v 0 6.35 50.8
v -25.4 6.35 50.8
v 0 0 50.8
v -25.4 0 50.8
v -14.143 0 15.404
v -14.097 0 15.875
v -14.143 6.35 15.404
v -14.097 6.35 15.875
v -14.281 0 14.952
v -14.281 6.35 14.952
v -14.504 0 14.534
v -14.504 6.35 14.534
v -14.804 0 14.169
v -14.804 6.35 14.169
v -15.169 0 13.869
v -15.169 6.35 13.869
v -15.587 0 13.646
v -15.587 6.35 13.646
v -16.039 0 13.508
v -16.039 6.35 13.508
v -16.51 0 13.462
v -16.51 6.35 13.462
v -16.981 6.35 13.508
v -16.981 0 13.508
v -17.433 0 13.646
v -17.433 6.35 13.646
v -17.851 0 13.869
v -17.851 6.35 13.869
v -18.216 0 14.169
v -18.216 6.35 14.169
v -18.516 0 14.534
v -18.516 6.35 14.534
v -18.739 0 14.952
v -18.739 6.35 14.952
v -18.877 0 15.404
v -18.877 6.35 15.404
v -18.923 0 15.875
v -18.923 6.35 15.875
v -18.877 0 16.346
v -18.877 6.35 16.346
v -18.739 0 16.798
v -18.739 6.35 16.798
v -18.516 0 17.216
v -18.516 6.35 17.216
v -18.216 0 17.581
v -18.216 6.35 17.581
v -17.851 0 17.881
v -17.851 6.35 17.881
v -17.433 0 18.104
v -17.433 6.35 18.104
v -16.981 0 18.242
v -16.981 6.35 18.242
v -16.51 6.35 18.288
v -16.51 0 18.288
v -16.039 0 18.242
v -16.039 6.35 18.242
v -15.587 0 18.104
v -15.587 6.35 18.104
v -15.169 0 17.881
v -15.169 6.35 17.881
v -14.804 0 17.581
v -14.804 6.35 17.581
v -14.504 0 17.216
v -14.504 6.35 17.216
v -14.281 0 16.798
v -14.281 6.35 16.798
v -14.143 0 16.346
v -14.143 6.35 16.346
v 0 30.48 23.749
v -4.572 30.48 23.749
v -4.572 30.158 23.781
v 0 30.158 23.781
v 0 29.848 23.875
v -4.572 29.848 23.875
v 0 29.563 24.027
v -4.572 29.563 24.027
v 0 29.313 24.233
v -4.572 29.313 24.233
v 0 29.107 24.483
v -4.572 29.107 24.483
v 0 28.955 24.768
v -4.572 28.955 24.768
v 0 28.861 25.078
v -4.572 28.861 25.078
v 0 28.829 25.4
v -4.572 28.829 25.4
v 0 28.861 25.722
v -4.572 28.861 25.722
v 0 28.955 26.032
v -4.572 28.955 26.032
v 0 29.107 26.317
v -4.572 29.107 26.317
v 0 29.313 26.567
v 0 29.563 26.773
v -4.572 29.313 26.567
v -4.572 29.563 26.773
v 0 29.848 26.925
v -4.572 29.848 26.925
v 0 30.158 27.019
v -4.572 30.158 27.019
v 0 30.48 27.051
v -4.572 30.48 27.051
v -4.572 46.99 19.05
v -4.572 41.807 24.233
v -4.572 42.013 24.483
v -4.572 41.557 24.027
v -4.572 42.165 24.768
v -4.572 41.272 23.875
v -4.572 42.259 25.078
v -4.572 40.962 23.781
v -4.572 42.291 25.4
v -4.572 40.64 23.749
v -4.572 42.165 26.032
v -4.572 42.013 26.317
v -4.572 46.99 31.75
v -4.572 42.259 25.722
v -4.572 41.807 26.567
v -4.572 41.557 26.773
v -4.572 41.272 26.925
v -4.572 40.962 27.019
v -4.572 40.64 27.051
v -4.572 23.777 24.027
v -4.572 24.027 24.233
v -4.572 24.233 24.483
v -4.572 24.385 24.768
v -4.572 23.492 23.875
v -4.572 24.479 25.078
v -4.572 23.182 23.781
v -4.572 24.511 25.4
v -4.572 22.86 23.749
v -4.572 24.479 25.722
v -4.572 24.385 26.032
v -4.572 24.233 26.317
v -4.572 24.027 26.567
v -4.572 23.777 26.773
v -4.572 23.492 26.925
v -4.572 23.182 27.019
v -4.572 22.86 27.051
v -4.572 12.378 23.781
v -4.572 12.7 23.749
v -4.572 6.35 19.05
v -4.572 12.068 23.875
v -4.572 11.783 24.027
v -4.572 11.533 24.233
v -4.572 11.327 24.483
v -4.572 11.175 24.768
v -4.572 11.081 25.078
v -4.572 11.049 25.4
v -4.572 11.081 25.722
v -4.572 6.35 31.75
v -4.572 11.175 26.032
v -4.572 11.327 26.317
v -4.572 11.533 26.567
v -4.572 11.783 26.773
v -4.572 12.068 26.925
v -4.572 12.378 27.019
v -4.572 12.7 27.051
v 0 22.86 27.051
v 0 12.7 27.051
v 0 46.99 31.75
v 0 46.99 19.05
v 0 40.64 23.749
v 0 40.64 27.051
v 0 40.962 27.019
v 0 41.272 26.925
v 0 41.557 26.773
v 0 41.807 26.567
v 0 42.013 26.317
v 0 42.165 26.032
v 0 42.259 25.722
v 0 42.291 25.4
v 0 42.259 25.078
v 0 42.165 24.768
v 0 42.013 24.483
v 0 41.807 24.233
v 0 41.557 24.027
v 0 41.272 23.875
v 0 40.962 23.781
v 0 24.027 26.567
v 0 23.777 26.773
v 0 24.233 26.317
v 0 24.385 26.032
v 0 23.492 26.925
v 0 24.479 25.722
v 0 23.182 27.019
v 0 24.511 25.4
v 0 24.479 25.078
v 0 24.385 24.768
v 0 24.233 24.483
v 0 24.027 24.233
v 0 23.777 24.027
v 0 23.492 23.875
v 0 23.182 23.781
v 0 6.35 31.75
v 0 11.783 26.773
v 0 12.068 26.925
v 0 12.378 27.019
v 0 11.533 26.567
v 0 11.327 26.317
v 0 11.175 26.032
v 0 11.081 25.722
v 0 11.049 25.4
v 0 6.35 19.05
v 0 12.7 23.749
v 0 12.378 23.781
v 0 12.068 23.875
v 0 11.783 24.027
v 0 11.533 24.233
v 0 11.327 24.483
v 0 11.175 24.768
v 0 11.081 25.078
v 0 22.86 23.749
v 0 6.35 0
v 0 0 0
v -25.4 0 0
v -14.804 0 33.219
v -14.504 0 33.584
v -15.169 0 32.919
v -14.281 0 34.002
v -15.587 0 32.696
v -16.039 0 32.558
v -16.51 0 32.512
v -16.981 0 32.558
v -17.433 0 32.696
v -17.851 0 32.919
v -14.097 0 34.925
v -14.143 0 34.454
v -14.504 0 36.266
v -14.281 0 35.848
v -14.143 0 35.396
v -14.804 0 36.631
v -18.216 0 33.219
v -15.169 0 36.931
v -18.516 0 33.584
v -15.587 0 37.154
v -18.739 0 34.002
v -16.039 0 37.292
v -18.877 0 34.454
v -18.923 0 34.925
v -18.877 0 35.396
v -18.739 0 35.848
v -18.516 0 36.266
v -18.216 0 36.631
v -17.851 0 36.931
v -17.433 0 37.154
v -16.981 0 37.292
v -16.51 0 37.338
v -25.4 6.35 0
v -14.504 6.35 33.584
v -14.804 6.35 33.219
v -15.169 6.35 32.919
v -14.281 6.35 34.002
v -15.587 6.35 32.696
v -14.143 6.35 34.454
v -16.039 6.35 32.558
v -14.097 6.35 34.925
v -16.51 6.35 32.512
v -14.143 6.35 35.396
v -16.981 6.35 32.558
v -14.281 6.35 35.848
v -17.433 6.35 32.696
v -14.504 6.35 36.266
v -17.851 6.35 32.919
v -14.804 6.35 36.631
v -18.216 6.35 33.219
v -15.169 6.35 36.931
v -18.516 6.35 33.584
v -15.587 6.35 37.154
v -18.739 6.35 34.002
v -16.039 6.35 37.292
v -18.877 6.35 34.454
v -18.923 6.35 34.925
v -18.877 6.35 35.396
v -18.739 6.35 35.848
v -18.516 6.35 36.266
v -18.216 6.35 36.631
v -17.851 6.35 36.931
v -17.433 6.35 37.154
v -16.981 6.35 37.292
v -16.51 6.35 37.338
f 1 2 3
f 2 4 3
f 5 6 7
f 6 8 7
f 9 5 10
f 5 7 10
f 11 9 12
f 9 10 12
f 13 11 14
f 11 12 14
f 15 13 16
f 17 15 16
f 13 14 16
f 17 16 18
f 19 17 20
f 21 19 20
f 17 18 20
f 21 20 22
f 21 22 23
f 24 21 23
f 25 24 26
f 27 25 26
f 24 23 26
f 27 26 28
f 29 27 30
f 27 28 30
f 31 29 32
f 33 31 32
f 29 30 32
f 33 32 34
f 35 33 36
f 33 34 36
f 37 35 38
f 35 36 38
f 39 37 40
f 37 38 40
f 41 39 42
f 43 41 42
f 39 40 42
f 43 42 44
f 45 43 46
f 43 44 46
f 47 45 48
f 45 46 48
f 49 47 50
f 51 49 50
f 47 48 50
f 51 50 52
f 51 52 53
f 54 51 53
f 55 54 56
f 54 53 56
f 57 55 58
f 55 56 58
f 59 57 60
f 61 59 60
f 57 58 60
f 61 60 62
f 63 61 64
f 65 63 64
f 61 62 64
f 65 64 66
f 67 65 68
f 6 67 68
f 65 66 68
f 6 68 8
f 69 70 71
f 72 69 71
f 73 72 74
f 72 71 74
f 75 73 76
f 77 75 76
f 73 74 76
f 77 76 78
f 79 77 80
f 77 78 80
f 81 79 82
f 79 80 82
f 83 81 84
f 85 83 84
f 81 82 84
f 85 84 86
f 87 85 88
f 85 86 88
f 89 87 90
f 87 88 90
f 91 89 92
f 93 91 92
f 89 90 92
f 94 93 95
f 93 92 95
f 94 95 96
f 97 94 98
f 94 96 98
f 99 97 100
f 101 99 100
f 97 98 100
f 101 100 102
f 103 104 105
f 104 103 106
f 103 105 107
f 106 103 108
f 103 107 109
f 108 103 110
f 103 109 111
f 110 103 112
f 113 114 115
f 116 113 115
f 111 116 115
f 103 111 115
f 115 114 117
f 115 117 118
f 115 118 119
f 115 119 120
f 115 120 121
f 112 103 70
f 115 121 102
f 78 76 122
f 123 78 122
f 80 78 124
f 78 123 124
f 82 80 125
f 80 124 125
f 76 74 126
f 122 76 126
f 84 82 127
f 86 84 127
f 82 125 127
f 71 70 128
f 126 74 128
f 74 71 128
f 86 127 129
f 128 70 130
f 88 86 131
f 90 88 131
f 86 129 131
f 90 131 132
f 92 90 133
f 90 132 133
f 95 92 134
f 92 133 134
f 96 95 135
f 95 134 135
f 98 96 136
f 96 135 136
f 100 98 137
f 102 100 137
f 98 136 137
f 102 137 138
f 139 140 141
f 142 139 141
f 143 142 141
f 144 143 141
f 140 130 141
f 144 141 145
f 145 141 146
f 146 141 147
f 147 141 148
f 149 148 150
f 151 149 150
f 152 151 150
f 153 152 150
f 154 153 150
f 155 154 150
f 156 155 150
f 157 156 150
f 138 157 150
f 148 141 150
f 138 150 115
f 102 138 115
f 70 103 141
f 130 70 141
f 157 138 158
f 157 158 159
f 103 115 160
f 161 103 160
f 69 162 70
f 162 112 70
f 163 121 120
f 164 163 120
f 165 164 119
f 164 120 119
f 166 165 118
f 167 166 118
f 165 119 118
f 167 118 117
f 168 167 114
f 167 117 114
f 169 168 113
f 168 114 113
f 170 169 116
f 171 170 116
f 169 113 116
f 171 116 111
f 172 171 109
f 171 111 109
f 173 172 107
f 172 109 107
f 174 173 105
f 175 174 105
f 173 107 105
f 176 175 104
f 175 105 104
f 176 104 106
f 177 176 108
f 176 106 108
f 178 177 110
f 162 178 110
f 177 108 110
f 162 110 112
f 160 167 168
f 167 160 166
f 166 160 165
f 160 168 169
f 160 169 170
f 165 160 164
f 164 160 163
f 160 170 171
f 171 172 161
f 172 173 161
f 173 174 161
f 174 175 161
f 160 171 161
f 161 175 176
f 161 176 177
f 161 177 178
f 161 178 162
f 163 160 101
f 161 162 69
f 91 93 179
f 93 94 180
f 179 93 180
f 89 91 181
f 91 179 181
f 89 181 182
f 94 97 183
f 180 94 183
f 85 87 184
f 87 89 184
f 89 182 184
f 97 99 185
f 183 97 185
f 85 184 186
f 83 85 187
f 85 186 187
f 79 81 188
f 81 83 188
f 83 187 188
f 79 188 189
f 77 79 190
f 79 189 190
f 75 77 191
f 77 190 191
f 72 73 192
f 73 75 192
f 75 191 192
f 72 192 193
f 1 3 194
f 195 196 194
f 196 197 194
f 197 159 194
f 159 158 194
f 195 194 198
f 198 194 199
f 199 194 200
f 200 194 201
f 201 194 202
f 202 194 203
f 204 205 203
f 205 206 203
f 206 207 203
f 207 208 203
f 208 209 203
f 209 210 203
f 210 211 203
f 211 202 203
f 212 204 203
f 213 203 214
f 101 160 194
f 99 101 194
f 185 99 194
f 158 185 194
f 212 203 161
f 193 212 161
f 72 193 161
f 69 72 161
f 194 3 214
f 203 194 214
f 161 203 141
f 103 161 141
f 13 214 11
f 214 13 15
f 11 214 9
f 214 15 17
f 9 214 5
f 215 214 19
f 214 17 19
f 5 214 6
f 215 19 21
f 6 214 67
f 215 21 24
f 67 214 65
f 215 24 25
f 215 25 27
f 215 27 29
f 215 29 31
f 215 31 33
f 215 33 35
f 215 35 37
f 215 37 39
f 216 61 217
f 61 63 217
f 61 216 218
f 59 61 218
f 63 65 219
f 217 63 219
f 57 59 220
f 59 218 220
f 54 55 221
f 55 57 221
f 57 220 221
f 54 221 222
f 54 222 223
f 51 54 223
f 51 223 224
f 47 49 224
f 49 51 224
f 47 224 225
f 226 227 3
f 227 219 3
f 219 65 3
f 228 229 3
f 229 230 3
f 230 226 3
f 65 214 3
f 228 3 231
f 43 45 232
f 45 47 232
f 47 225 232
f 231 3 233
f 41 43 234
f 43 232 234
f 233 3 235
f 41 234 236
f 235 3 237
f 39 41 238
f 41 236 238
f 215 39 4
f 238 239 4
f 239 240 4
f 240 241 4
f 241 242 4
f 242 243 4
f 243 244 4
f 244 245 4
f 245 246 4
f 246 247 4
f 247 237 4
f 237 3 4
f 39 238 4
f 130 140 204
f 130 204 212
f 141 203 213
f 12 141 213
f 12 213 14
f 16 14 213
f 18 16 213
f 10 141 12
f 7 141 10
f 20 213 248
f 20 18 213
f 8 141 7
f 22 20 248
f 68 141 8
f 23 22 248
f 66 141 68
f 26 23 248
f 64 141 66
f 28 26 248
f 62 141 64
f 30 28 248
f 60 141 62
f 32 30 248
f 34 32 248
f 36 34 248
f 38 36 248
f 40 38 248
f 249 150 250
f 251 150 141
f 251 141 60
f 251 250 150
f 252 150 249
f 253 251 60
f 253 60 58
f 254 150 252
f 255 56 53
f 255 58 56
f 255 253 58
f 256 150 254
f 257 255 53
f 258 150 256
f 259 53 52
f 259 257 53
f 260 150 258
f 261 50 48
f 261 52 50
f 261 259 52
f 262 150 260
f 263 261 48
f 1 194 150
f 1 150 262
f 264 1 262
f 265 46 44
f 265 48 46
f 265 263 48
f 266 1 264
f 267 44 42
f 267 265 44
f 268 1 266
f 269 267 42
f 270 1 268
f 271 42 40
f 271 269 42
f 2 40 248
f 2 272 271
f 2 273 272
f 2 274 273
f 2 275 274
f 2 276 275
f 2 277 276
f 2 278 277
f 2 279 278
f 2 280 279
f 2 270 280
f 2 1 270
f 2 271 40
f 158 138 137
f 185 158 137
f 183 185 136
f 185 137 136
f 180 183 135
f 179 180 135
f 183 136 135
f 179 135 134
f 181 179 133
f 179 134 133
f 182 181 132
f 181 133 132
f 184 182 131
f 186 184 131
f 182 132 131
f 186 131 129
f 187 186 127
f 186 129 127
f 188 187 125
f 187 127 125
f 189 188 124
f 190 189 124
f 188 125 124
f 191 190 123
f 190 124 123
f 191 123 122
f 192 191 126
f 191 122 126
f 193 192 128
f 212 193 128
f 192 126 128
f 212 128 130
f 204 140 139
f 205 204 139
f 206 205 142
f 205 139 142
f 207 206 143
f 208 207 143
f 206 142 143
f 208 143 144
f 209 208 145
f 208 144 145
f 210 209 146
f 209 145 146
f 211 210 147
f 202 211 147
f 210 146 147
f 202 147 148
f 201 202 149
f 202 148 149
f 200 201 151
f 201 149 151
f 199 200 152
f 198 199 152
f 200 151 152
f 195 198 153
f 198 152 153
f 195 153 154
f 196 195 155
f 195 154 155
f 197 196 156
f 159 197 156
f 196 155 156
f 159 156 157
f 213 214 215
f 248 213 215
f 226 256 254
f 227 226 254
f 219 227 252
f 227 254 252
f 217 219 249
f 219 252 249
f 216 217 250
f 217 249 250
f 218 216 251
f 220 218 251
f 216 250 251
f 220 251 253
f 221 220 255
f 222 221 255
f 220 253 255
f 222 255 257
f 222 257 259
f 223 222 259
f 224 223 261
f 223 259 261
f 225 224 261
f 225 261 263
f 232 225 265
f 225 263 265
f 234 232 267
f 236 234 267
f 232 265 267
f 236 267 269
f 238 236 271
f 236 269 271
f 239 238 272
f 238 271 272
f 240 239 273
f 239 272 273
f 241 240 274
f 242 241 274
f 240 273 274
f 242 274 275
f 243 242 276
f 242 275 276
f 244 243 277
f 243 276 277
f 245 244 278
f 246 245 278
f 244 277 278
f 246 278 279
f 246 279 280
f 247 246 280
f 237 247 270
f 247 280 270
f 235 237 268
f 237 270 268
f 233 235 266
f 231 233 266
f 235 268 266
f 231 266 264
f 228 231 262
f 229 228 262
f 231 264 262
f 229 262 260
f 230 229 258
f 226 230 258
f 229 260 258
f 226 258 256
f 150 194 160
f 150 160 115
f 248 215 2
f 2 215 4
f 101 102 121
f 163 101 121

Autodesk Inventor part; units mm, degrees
ref_plane "YZ Plane" through (0, 0, 0) normal (1, 0, 0) x (0, 1, 0)
ref_plane "XZ Plane" through (0, 0, 0) normal (0, 1, 0) x (-1, 0, 0)
ref_plane "XY Plane" through (0, 0, 0) normal (0, 0, 1) x (1, 0, 0)
sketch "Sketch15" plane through (0, 0, 0) normal (0, 1, 0) x (-1, 0, 0)
  line L0 (0, 0) -> (25.4, 0)
  line L1 (25.4, 0) -> (25.4, 50.8)
  line L2 (25.4, 50.8) -> (0, 50.8)
  line L3 (0, 50.8) -> (0, 0)
  dimension "d64" = 25.4
  dimension "d65" = 50.8
extrude "Extrusion12" add sketch "Sketch15" along normal blind 6.35
sketch "Sketch17" plane through (0, 6.35, 0) normal (0, 1, 0) x (1, 0, 0)
  line L0 (-25.4, 0) -> (-25.4, -50.8) projected
  line L1 (-25.4, -50.8) -> (0, -50.8) projected
  line L2 (0, -50.8) -> (0, 0) projected
  line L3 (0, 0) -> (-25.4, 0) projected
  line L4 (0, -25.4) -> (0, -19.05)
  line L5 (0, -25.4) -> (0, -31.75)
  line L6 (0, -31.75) -> (-4.572, -31.75)
  line L7 (-4.572, -31.75) -> (0, -31.75)
  line L8 (0, -31.75) -> (0, -19.05)
  line L9 (0, -19.05) -> (-4.572, -19.05)
  line L10 (-4.572, -19.05) -> (-4.572, -31.75)
  dimension "d74" = 6.35
  dimension "d75" = 6.35
  dimension "d76" = 4.572
extrude "Extrusion14" add sketch "Sketch17" along normal blind 40.64 contours L2 L6 L10 L9
sketch "Sketch18" plane through (-4.572, 6.35, 19.05) normal (-1, 0, 0) x (0, 0, 1)
  line L0 (12.7, 0) -> (0, 0) projected
  line L1 (12.7, 0) -> (12.7, 40.64) projected
  line L2 (0, 40.64) -> (12.7, 40.64) projected
  line L3 (0, 0) -> (0, 40.64) projected
  line L4 (0, 20.32) -> (12.7, 20.32) construction
  line L5 (6.35, 20.32) -> (6.35, 24.13) construction
  line L6 (6.35, 24.13) -> (6.35, 34.29) construction
  line L7 (8.001, 24.13) -> (8.001, 34.29)
  line L8 (4.699, 34.29) -> (4.699, 24.13)
  arc A0 (4.699, 24.13) -> (8.001, 24.13) centre (6.35, 24.13) ccw
  arc A1 (8.001, 34.29) -> (4.699, 34.29) centre (6.35, 34.29) ccw
  line L9 (8.001, 16.51) -> (8.001, 6.35)
  line L10 (4.699, 6.35) -> (4.699, 16.51)
  arc A2 (8.001, 16.51) -> (4.699, 16.51) centre (6.35, 16.51) ccw
  arc A3 (4.699, 6.35) -> (8.001, 6.35) centre (6.35, 6.35) ccw
  point P0 (-19.05, -6.35)
  point P1 (6.35, 29.21)
  dimension "d79" = 3.81
  dimension "d80" = 10.16
  dimension "d81" = 3.302
extrude "Extrusion15" cut sketch "Sketch18" against normal up to next contours A0 L8 A1 L7 | L9 A3 L10 A2
sketch "Sketch19" plane through (0, 6.35, 0) normal (0, 1, 0) x (1, 0, 0)
  line L0 (-4.572, -19.05) -> (0, -19.05) projected
  line L1 (0, -19.05) -> (0, 0) projected
  line L2 (0, 0) -> (-25.4, 0) projected
  line L3 (-25.4, 0) -> (-25.4, -50.8) projected
  line L4 (-25.4, -50.8) -> (0, -50.8) projected
  line L5 (0, -50.8) -> (0, -31.75) projected
  line L6 (0, -31.75) -> (-4.572, -31.75) projected
  line L7 (-4.572, -31.75) -> (-4.572, -19.05) projected
  line L8 (-25.4, -25.4) -> (0, -25.4) construction
  line L9 (0, -50.8) -> (0, 0) projected
  line L10 (-12.7, -25.4) -> (-16.51, -25.4)
  line L11 (-16.51, -25.4) -> (-16.51, -15.875) construction
  circle A0 centre (-16.51, -15.875) radius 2.413
  line L12 (-16.51, -25.4) -> (-16.51, -34.925) construction
  circle A1 centre (-16.51, -34.925) radius 2.413
  dimension "d84" = 3.81
  dimension "d85" = 9.525
  dimension "d86" = 4.826
extrude "Extrusion16" cut sketch "Sketch19" against normal up to next contours A0 | A1
equation "\"base_thickness\" = 6.35"
equation "\"motor_adapter_width\" = 19.05"
equation "\"d16\" = 0.5 * motor_adapter_width"
equation "\"motor_adapter_across\" = 21.59"
equation "\"motor_u_adapterthickness\" = 3.81"
properties part number "motor_u_adapter"
